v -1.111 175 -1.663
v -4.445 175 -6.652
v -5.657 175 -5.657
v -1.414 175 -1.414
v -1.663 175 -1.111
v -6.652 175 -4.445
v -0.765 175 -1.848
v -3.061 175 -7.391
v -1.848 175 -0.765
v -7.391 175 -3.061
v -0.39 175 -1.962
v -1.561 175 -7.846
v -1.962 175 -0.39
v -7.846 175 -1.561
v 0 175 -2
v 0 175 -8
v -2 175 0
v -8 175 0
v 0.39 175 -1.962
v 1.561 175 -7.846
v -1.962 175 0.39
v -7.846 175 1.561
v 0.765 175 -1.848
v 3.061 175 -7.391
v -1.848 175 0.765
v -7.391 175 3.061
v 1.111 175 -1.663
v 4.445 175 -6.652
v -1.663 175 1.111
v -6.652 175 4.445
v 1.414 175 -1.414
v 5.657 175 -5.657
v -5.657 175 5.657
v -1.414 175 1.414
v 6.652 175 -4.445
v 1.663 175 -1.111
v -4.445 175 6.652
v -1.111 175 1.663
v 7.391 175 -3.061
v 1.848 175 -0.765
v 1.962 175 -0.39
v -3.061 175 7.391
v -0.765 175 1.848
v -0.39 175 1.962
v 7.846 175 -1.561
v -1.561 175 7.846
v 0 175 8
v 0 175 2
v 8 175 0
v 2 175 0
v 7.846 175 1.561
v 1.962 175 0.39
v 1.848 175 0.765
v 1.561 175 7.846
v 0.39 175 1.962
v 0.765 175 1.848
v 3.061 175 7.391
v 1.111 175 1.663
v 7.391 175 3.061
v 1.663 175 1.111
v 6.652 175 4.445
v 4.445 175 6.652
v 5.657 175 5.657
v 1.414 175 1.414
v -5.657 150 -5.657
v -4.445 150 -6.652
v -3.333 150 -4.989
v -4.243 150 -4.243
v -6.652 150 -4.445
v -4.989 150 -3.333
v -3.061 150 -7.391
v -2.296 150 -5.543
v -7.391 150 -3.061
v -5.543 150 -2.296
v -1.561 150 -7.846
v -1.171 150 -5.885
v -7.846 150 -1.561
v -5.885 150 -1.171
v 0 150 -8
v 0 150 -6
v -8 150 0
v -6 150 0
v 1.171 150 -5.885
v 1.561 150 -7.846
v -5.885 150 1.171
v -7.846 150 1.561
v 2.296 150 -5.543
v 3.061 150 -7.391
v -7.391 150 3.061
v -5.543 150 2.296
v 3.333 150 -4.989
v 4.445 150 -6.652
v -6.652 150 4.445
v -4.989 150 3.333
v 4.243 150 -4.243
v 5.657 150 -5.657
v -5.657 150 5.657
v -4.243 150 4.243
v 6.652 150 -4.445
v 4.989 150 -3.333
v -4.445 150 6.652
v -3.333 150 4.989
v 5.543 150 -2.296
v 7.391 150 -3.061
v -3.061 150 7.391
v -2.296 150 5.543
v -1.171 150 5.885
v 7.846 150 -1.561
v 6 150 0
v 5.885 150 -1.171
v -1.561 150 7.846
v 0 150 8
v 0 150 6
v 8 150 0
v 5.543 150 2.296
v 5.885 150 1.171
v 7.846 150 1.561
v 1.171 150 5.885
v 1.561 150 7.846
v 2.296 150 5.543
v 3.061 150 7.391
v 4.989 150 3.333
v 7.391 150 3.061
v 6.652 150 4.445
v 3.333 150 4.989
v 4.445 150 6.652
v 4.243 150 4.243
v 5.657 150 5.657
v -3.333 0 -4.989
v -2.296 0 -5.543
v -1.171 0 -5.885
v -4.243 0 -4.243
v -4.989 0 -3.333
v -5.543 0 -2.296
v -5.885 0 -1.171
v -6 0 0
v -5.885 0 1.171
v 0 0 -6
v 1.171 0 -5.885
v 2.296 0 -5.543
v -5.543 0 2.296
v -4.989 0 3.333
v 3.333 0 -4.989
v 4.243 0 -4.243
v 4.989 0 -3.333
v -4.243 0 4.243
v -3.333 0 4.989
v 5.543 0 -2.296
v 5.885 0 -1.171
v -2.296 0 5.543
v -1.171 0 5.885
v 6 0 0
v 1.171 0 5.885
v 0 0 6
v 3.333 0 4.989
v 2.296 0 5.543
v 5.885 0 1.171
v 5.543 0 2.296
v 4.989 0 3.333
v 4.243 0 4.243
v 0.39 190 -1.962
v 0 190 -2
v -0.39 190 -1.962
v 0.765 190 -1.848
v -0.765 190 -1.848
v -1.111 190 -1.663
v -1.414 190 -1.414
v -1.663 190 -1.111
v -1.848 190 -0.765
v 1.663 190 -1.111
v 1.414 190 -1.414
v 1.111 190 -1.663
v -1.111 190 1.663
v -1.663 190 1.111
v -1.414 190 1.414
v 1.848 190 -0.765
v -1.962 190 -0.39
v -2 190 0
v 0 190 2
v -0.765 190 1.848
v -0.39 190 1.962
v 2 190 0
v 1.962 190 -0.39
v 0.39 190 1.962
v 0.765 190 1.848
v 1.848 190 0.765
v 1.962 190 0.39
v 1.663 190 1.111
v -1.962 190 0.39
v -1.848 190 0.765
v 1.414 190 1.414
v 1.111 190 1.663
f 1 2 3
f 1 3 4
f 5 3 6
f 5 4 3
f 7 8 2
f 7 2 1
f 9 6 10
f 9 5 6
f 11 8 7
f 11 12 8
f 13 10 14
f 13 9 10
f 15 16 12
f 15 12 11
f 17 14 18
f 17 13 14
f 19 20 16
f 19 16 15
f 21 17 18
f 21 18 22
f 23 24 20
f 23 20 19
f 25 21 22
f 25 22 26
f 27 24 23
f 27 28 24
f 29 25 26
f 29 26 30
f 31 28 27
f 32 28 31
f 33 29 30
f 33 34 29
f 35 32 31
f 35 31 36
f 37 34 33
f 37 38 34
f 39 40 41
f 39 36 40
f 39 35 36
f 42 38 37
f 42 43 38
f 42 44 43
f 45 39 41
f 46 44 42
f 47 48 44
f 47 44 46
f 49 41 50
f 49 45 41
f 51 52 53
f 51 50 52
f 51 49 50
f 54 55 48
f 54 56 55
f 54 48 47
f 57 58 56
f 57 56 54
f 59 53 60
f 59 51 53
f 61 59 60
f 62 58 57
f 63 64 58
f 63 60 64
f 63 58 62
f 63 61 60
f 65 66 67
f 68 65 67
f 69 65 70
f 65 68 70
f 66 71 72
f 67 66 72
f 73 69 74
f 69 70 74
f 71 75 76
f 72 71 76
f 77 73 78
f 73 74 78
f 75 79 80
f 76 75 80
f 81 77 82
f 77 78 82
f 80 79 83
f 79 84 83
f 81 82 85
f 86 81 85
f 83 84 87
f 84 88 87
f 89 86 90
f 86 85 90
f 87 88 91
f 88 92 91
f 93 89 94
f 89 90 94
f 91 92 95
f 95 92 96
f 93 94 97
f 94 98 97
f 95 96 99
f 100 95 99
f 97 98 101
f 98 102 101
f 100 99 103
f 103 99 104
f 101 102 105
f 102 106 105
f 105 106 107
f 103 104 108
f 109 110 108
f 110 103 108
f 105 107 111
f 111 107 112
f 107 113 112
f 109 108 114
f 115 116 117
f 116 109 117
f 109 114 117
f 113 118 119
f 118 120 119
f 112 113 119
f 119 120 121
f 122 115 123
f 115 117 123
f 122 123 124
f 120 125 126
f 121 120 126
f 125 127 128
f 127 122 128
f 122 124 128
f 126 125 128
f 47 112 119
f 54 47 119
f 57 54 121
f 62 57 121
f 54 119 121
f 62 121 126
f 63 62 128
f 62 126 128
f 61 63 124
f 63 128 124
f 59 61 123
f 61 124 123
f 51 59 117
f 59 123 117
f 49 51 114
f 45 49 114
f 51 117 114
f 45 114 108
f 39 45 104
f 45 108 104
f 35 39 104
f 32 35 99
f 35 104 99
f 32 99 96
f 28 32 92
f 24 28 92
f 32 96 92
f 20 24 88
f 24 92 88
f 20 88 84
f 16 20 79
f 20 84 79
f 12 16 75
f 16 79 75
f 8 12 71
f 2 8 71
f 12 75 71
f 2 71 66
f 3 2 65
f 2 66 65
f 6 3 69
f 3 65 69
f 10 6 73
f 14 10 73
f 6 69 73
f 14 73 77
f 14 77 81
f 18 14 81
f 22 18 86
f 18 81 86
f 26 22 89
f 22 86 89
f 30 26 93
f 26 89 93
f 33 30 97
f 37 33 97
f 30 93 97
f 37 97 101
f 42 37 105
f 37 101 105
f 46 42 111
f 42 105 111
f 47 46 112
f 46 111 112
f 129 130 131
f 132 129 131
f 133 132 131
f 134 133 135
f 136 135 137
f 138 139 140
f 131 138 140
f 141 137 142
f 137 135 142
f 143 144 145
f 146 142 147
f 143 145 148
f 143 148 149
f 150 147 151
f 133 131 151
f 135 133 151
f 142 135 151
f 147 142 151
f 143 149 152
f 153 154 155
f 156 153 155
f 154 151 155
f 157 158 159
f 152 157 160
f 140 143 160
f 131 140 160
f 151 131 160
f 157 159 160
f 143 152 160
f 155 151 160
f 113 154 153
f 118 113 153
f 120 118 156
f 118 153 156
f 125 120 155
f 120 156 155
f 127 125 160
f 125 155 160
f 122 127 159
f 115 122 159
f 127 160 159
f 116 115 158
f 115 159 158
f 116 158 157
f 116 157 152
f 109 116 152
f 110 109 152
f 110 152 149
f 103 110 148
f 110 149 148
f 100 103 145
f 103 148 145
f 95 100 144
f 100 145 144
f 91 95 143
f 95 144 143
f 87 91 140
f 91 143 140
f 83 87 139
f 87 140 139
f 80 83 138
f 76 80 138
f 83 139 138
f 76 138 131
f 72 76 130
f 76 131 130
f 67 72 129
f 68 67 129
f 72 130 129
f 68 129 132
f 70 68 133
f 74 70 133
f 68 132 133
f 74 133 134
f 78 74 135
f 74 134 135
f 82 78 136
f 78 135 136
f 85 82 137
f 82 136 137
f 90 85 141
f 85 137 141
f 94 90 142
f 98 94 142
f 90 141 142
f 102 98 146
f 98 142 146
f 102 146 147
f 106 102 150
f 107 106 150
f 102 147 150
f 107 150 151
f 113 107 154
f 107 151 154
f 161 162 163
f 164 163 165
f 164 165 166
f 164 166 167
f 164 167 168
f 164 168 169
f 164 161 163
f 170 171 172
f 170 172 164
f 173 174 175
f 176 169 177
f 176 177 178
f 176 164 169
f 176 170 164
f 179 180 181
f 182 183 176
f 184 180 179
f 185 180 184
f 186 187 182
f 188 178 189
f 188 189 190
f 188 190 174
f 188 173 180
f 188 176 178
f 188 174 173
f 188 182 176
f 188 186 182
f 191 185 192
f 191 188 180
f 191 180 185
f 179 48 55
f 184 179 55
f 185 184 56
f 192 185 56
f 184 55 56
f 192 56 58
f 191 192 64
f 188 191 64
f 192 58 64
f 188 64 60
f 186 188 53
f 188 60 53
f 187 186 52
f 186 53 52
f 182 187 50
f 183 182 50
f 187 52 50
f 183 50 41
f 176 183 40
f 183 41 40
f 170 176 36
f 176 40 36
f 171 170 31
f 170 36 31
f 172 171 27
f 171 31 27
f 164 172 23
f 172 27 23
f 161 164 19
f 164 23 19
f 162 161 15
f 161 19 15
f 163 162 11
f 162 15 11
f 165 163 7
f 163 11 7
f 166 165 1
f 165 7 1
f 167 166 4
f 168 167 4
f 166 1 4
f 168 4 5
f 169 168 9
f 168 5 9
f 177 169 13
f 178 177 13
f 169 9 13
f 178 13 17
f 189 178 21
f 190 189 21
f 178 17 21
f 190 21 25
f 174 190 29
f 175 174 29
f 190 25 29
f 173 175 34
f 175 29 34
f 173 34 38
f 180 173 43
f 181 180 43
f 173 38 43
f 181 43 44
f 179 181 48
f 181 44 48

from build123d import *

# Parameters (mm, degrees)
SKETCH1_R            = 6
ELECTRODE_BODY_DEPTH = 150
CAP_START            = 150
SKETCH2_R            = 8
CAP_DEPTH            = 25
CABLE_STUB_START     = 175
SKETCH3_R            = 2
CABLE_STUB_DEPTH     = 15
SKETCH4_R            = 2
PLATINUM_TIP_DEPTH   = 1.5


with BuildPart() as part:
    # Sketch1 → Electrode_Body (new body)
    with BuildSketch(Plane(origin=(0, 0, 0), x_dir=(1, 0, 0), z_dir=(0, 1, 0))):
        with Locations(Location((0, 0, 0), (0, 0, 270))):
            Circle(SKETCH1_R)
    extrude(amount=ELECTRODE_BODY_DEPTH)

    # Sketch2 → Cap (add)
    with BuildSketch(Plane(origin=(0, 0, 0), x_dir=(1, 0, 0), z_dir=(0, 1, 0)).offset(CAP_START)):
        with Locations(Location((0, 0, 0), (0, 0, 270))):
            Circle(SKETCH2_R)
    extrude(amount=CAP_DEPTH)

    # Sketch3 → Cable_Stub (add)
    with BuildSketch(Plane(origin=(0, 0, 0), x_dir=(1, 0, 0), z_dir=(0, 1, 0)).offset(CABLE_STUB_START)):
        with Locations(Location((0, 0, 0), (0, 0, 270))):
            Circle(SKETCH3_R)
    extrude(amount=CABLE_STUB_DEPTH)

    # Sketch4 → Platinum_Tip (add)
    with BuildSketch(Plane(origin=(0, 0, 0), x_dir=(1, 0, 0), z_dir=(0, 1, 0))):
        with Locations(Location((0, 0, 0), (0, 0, 270))):
            Circle(SKETCH4_R)
    extrude(amount=PLATINUM_TIP_DEPTH)


solid = part.part
